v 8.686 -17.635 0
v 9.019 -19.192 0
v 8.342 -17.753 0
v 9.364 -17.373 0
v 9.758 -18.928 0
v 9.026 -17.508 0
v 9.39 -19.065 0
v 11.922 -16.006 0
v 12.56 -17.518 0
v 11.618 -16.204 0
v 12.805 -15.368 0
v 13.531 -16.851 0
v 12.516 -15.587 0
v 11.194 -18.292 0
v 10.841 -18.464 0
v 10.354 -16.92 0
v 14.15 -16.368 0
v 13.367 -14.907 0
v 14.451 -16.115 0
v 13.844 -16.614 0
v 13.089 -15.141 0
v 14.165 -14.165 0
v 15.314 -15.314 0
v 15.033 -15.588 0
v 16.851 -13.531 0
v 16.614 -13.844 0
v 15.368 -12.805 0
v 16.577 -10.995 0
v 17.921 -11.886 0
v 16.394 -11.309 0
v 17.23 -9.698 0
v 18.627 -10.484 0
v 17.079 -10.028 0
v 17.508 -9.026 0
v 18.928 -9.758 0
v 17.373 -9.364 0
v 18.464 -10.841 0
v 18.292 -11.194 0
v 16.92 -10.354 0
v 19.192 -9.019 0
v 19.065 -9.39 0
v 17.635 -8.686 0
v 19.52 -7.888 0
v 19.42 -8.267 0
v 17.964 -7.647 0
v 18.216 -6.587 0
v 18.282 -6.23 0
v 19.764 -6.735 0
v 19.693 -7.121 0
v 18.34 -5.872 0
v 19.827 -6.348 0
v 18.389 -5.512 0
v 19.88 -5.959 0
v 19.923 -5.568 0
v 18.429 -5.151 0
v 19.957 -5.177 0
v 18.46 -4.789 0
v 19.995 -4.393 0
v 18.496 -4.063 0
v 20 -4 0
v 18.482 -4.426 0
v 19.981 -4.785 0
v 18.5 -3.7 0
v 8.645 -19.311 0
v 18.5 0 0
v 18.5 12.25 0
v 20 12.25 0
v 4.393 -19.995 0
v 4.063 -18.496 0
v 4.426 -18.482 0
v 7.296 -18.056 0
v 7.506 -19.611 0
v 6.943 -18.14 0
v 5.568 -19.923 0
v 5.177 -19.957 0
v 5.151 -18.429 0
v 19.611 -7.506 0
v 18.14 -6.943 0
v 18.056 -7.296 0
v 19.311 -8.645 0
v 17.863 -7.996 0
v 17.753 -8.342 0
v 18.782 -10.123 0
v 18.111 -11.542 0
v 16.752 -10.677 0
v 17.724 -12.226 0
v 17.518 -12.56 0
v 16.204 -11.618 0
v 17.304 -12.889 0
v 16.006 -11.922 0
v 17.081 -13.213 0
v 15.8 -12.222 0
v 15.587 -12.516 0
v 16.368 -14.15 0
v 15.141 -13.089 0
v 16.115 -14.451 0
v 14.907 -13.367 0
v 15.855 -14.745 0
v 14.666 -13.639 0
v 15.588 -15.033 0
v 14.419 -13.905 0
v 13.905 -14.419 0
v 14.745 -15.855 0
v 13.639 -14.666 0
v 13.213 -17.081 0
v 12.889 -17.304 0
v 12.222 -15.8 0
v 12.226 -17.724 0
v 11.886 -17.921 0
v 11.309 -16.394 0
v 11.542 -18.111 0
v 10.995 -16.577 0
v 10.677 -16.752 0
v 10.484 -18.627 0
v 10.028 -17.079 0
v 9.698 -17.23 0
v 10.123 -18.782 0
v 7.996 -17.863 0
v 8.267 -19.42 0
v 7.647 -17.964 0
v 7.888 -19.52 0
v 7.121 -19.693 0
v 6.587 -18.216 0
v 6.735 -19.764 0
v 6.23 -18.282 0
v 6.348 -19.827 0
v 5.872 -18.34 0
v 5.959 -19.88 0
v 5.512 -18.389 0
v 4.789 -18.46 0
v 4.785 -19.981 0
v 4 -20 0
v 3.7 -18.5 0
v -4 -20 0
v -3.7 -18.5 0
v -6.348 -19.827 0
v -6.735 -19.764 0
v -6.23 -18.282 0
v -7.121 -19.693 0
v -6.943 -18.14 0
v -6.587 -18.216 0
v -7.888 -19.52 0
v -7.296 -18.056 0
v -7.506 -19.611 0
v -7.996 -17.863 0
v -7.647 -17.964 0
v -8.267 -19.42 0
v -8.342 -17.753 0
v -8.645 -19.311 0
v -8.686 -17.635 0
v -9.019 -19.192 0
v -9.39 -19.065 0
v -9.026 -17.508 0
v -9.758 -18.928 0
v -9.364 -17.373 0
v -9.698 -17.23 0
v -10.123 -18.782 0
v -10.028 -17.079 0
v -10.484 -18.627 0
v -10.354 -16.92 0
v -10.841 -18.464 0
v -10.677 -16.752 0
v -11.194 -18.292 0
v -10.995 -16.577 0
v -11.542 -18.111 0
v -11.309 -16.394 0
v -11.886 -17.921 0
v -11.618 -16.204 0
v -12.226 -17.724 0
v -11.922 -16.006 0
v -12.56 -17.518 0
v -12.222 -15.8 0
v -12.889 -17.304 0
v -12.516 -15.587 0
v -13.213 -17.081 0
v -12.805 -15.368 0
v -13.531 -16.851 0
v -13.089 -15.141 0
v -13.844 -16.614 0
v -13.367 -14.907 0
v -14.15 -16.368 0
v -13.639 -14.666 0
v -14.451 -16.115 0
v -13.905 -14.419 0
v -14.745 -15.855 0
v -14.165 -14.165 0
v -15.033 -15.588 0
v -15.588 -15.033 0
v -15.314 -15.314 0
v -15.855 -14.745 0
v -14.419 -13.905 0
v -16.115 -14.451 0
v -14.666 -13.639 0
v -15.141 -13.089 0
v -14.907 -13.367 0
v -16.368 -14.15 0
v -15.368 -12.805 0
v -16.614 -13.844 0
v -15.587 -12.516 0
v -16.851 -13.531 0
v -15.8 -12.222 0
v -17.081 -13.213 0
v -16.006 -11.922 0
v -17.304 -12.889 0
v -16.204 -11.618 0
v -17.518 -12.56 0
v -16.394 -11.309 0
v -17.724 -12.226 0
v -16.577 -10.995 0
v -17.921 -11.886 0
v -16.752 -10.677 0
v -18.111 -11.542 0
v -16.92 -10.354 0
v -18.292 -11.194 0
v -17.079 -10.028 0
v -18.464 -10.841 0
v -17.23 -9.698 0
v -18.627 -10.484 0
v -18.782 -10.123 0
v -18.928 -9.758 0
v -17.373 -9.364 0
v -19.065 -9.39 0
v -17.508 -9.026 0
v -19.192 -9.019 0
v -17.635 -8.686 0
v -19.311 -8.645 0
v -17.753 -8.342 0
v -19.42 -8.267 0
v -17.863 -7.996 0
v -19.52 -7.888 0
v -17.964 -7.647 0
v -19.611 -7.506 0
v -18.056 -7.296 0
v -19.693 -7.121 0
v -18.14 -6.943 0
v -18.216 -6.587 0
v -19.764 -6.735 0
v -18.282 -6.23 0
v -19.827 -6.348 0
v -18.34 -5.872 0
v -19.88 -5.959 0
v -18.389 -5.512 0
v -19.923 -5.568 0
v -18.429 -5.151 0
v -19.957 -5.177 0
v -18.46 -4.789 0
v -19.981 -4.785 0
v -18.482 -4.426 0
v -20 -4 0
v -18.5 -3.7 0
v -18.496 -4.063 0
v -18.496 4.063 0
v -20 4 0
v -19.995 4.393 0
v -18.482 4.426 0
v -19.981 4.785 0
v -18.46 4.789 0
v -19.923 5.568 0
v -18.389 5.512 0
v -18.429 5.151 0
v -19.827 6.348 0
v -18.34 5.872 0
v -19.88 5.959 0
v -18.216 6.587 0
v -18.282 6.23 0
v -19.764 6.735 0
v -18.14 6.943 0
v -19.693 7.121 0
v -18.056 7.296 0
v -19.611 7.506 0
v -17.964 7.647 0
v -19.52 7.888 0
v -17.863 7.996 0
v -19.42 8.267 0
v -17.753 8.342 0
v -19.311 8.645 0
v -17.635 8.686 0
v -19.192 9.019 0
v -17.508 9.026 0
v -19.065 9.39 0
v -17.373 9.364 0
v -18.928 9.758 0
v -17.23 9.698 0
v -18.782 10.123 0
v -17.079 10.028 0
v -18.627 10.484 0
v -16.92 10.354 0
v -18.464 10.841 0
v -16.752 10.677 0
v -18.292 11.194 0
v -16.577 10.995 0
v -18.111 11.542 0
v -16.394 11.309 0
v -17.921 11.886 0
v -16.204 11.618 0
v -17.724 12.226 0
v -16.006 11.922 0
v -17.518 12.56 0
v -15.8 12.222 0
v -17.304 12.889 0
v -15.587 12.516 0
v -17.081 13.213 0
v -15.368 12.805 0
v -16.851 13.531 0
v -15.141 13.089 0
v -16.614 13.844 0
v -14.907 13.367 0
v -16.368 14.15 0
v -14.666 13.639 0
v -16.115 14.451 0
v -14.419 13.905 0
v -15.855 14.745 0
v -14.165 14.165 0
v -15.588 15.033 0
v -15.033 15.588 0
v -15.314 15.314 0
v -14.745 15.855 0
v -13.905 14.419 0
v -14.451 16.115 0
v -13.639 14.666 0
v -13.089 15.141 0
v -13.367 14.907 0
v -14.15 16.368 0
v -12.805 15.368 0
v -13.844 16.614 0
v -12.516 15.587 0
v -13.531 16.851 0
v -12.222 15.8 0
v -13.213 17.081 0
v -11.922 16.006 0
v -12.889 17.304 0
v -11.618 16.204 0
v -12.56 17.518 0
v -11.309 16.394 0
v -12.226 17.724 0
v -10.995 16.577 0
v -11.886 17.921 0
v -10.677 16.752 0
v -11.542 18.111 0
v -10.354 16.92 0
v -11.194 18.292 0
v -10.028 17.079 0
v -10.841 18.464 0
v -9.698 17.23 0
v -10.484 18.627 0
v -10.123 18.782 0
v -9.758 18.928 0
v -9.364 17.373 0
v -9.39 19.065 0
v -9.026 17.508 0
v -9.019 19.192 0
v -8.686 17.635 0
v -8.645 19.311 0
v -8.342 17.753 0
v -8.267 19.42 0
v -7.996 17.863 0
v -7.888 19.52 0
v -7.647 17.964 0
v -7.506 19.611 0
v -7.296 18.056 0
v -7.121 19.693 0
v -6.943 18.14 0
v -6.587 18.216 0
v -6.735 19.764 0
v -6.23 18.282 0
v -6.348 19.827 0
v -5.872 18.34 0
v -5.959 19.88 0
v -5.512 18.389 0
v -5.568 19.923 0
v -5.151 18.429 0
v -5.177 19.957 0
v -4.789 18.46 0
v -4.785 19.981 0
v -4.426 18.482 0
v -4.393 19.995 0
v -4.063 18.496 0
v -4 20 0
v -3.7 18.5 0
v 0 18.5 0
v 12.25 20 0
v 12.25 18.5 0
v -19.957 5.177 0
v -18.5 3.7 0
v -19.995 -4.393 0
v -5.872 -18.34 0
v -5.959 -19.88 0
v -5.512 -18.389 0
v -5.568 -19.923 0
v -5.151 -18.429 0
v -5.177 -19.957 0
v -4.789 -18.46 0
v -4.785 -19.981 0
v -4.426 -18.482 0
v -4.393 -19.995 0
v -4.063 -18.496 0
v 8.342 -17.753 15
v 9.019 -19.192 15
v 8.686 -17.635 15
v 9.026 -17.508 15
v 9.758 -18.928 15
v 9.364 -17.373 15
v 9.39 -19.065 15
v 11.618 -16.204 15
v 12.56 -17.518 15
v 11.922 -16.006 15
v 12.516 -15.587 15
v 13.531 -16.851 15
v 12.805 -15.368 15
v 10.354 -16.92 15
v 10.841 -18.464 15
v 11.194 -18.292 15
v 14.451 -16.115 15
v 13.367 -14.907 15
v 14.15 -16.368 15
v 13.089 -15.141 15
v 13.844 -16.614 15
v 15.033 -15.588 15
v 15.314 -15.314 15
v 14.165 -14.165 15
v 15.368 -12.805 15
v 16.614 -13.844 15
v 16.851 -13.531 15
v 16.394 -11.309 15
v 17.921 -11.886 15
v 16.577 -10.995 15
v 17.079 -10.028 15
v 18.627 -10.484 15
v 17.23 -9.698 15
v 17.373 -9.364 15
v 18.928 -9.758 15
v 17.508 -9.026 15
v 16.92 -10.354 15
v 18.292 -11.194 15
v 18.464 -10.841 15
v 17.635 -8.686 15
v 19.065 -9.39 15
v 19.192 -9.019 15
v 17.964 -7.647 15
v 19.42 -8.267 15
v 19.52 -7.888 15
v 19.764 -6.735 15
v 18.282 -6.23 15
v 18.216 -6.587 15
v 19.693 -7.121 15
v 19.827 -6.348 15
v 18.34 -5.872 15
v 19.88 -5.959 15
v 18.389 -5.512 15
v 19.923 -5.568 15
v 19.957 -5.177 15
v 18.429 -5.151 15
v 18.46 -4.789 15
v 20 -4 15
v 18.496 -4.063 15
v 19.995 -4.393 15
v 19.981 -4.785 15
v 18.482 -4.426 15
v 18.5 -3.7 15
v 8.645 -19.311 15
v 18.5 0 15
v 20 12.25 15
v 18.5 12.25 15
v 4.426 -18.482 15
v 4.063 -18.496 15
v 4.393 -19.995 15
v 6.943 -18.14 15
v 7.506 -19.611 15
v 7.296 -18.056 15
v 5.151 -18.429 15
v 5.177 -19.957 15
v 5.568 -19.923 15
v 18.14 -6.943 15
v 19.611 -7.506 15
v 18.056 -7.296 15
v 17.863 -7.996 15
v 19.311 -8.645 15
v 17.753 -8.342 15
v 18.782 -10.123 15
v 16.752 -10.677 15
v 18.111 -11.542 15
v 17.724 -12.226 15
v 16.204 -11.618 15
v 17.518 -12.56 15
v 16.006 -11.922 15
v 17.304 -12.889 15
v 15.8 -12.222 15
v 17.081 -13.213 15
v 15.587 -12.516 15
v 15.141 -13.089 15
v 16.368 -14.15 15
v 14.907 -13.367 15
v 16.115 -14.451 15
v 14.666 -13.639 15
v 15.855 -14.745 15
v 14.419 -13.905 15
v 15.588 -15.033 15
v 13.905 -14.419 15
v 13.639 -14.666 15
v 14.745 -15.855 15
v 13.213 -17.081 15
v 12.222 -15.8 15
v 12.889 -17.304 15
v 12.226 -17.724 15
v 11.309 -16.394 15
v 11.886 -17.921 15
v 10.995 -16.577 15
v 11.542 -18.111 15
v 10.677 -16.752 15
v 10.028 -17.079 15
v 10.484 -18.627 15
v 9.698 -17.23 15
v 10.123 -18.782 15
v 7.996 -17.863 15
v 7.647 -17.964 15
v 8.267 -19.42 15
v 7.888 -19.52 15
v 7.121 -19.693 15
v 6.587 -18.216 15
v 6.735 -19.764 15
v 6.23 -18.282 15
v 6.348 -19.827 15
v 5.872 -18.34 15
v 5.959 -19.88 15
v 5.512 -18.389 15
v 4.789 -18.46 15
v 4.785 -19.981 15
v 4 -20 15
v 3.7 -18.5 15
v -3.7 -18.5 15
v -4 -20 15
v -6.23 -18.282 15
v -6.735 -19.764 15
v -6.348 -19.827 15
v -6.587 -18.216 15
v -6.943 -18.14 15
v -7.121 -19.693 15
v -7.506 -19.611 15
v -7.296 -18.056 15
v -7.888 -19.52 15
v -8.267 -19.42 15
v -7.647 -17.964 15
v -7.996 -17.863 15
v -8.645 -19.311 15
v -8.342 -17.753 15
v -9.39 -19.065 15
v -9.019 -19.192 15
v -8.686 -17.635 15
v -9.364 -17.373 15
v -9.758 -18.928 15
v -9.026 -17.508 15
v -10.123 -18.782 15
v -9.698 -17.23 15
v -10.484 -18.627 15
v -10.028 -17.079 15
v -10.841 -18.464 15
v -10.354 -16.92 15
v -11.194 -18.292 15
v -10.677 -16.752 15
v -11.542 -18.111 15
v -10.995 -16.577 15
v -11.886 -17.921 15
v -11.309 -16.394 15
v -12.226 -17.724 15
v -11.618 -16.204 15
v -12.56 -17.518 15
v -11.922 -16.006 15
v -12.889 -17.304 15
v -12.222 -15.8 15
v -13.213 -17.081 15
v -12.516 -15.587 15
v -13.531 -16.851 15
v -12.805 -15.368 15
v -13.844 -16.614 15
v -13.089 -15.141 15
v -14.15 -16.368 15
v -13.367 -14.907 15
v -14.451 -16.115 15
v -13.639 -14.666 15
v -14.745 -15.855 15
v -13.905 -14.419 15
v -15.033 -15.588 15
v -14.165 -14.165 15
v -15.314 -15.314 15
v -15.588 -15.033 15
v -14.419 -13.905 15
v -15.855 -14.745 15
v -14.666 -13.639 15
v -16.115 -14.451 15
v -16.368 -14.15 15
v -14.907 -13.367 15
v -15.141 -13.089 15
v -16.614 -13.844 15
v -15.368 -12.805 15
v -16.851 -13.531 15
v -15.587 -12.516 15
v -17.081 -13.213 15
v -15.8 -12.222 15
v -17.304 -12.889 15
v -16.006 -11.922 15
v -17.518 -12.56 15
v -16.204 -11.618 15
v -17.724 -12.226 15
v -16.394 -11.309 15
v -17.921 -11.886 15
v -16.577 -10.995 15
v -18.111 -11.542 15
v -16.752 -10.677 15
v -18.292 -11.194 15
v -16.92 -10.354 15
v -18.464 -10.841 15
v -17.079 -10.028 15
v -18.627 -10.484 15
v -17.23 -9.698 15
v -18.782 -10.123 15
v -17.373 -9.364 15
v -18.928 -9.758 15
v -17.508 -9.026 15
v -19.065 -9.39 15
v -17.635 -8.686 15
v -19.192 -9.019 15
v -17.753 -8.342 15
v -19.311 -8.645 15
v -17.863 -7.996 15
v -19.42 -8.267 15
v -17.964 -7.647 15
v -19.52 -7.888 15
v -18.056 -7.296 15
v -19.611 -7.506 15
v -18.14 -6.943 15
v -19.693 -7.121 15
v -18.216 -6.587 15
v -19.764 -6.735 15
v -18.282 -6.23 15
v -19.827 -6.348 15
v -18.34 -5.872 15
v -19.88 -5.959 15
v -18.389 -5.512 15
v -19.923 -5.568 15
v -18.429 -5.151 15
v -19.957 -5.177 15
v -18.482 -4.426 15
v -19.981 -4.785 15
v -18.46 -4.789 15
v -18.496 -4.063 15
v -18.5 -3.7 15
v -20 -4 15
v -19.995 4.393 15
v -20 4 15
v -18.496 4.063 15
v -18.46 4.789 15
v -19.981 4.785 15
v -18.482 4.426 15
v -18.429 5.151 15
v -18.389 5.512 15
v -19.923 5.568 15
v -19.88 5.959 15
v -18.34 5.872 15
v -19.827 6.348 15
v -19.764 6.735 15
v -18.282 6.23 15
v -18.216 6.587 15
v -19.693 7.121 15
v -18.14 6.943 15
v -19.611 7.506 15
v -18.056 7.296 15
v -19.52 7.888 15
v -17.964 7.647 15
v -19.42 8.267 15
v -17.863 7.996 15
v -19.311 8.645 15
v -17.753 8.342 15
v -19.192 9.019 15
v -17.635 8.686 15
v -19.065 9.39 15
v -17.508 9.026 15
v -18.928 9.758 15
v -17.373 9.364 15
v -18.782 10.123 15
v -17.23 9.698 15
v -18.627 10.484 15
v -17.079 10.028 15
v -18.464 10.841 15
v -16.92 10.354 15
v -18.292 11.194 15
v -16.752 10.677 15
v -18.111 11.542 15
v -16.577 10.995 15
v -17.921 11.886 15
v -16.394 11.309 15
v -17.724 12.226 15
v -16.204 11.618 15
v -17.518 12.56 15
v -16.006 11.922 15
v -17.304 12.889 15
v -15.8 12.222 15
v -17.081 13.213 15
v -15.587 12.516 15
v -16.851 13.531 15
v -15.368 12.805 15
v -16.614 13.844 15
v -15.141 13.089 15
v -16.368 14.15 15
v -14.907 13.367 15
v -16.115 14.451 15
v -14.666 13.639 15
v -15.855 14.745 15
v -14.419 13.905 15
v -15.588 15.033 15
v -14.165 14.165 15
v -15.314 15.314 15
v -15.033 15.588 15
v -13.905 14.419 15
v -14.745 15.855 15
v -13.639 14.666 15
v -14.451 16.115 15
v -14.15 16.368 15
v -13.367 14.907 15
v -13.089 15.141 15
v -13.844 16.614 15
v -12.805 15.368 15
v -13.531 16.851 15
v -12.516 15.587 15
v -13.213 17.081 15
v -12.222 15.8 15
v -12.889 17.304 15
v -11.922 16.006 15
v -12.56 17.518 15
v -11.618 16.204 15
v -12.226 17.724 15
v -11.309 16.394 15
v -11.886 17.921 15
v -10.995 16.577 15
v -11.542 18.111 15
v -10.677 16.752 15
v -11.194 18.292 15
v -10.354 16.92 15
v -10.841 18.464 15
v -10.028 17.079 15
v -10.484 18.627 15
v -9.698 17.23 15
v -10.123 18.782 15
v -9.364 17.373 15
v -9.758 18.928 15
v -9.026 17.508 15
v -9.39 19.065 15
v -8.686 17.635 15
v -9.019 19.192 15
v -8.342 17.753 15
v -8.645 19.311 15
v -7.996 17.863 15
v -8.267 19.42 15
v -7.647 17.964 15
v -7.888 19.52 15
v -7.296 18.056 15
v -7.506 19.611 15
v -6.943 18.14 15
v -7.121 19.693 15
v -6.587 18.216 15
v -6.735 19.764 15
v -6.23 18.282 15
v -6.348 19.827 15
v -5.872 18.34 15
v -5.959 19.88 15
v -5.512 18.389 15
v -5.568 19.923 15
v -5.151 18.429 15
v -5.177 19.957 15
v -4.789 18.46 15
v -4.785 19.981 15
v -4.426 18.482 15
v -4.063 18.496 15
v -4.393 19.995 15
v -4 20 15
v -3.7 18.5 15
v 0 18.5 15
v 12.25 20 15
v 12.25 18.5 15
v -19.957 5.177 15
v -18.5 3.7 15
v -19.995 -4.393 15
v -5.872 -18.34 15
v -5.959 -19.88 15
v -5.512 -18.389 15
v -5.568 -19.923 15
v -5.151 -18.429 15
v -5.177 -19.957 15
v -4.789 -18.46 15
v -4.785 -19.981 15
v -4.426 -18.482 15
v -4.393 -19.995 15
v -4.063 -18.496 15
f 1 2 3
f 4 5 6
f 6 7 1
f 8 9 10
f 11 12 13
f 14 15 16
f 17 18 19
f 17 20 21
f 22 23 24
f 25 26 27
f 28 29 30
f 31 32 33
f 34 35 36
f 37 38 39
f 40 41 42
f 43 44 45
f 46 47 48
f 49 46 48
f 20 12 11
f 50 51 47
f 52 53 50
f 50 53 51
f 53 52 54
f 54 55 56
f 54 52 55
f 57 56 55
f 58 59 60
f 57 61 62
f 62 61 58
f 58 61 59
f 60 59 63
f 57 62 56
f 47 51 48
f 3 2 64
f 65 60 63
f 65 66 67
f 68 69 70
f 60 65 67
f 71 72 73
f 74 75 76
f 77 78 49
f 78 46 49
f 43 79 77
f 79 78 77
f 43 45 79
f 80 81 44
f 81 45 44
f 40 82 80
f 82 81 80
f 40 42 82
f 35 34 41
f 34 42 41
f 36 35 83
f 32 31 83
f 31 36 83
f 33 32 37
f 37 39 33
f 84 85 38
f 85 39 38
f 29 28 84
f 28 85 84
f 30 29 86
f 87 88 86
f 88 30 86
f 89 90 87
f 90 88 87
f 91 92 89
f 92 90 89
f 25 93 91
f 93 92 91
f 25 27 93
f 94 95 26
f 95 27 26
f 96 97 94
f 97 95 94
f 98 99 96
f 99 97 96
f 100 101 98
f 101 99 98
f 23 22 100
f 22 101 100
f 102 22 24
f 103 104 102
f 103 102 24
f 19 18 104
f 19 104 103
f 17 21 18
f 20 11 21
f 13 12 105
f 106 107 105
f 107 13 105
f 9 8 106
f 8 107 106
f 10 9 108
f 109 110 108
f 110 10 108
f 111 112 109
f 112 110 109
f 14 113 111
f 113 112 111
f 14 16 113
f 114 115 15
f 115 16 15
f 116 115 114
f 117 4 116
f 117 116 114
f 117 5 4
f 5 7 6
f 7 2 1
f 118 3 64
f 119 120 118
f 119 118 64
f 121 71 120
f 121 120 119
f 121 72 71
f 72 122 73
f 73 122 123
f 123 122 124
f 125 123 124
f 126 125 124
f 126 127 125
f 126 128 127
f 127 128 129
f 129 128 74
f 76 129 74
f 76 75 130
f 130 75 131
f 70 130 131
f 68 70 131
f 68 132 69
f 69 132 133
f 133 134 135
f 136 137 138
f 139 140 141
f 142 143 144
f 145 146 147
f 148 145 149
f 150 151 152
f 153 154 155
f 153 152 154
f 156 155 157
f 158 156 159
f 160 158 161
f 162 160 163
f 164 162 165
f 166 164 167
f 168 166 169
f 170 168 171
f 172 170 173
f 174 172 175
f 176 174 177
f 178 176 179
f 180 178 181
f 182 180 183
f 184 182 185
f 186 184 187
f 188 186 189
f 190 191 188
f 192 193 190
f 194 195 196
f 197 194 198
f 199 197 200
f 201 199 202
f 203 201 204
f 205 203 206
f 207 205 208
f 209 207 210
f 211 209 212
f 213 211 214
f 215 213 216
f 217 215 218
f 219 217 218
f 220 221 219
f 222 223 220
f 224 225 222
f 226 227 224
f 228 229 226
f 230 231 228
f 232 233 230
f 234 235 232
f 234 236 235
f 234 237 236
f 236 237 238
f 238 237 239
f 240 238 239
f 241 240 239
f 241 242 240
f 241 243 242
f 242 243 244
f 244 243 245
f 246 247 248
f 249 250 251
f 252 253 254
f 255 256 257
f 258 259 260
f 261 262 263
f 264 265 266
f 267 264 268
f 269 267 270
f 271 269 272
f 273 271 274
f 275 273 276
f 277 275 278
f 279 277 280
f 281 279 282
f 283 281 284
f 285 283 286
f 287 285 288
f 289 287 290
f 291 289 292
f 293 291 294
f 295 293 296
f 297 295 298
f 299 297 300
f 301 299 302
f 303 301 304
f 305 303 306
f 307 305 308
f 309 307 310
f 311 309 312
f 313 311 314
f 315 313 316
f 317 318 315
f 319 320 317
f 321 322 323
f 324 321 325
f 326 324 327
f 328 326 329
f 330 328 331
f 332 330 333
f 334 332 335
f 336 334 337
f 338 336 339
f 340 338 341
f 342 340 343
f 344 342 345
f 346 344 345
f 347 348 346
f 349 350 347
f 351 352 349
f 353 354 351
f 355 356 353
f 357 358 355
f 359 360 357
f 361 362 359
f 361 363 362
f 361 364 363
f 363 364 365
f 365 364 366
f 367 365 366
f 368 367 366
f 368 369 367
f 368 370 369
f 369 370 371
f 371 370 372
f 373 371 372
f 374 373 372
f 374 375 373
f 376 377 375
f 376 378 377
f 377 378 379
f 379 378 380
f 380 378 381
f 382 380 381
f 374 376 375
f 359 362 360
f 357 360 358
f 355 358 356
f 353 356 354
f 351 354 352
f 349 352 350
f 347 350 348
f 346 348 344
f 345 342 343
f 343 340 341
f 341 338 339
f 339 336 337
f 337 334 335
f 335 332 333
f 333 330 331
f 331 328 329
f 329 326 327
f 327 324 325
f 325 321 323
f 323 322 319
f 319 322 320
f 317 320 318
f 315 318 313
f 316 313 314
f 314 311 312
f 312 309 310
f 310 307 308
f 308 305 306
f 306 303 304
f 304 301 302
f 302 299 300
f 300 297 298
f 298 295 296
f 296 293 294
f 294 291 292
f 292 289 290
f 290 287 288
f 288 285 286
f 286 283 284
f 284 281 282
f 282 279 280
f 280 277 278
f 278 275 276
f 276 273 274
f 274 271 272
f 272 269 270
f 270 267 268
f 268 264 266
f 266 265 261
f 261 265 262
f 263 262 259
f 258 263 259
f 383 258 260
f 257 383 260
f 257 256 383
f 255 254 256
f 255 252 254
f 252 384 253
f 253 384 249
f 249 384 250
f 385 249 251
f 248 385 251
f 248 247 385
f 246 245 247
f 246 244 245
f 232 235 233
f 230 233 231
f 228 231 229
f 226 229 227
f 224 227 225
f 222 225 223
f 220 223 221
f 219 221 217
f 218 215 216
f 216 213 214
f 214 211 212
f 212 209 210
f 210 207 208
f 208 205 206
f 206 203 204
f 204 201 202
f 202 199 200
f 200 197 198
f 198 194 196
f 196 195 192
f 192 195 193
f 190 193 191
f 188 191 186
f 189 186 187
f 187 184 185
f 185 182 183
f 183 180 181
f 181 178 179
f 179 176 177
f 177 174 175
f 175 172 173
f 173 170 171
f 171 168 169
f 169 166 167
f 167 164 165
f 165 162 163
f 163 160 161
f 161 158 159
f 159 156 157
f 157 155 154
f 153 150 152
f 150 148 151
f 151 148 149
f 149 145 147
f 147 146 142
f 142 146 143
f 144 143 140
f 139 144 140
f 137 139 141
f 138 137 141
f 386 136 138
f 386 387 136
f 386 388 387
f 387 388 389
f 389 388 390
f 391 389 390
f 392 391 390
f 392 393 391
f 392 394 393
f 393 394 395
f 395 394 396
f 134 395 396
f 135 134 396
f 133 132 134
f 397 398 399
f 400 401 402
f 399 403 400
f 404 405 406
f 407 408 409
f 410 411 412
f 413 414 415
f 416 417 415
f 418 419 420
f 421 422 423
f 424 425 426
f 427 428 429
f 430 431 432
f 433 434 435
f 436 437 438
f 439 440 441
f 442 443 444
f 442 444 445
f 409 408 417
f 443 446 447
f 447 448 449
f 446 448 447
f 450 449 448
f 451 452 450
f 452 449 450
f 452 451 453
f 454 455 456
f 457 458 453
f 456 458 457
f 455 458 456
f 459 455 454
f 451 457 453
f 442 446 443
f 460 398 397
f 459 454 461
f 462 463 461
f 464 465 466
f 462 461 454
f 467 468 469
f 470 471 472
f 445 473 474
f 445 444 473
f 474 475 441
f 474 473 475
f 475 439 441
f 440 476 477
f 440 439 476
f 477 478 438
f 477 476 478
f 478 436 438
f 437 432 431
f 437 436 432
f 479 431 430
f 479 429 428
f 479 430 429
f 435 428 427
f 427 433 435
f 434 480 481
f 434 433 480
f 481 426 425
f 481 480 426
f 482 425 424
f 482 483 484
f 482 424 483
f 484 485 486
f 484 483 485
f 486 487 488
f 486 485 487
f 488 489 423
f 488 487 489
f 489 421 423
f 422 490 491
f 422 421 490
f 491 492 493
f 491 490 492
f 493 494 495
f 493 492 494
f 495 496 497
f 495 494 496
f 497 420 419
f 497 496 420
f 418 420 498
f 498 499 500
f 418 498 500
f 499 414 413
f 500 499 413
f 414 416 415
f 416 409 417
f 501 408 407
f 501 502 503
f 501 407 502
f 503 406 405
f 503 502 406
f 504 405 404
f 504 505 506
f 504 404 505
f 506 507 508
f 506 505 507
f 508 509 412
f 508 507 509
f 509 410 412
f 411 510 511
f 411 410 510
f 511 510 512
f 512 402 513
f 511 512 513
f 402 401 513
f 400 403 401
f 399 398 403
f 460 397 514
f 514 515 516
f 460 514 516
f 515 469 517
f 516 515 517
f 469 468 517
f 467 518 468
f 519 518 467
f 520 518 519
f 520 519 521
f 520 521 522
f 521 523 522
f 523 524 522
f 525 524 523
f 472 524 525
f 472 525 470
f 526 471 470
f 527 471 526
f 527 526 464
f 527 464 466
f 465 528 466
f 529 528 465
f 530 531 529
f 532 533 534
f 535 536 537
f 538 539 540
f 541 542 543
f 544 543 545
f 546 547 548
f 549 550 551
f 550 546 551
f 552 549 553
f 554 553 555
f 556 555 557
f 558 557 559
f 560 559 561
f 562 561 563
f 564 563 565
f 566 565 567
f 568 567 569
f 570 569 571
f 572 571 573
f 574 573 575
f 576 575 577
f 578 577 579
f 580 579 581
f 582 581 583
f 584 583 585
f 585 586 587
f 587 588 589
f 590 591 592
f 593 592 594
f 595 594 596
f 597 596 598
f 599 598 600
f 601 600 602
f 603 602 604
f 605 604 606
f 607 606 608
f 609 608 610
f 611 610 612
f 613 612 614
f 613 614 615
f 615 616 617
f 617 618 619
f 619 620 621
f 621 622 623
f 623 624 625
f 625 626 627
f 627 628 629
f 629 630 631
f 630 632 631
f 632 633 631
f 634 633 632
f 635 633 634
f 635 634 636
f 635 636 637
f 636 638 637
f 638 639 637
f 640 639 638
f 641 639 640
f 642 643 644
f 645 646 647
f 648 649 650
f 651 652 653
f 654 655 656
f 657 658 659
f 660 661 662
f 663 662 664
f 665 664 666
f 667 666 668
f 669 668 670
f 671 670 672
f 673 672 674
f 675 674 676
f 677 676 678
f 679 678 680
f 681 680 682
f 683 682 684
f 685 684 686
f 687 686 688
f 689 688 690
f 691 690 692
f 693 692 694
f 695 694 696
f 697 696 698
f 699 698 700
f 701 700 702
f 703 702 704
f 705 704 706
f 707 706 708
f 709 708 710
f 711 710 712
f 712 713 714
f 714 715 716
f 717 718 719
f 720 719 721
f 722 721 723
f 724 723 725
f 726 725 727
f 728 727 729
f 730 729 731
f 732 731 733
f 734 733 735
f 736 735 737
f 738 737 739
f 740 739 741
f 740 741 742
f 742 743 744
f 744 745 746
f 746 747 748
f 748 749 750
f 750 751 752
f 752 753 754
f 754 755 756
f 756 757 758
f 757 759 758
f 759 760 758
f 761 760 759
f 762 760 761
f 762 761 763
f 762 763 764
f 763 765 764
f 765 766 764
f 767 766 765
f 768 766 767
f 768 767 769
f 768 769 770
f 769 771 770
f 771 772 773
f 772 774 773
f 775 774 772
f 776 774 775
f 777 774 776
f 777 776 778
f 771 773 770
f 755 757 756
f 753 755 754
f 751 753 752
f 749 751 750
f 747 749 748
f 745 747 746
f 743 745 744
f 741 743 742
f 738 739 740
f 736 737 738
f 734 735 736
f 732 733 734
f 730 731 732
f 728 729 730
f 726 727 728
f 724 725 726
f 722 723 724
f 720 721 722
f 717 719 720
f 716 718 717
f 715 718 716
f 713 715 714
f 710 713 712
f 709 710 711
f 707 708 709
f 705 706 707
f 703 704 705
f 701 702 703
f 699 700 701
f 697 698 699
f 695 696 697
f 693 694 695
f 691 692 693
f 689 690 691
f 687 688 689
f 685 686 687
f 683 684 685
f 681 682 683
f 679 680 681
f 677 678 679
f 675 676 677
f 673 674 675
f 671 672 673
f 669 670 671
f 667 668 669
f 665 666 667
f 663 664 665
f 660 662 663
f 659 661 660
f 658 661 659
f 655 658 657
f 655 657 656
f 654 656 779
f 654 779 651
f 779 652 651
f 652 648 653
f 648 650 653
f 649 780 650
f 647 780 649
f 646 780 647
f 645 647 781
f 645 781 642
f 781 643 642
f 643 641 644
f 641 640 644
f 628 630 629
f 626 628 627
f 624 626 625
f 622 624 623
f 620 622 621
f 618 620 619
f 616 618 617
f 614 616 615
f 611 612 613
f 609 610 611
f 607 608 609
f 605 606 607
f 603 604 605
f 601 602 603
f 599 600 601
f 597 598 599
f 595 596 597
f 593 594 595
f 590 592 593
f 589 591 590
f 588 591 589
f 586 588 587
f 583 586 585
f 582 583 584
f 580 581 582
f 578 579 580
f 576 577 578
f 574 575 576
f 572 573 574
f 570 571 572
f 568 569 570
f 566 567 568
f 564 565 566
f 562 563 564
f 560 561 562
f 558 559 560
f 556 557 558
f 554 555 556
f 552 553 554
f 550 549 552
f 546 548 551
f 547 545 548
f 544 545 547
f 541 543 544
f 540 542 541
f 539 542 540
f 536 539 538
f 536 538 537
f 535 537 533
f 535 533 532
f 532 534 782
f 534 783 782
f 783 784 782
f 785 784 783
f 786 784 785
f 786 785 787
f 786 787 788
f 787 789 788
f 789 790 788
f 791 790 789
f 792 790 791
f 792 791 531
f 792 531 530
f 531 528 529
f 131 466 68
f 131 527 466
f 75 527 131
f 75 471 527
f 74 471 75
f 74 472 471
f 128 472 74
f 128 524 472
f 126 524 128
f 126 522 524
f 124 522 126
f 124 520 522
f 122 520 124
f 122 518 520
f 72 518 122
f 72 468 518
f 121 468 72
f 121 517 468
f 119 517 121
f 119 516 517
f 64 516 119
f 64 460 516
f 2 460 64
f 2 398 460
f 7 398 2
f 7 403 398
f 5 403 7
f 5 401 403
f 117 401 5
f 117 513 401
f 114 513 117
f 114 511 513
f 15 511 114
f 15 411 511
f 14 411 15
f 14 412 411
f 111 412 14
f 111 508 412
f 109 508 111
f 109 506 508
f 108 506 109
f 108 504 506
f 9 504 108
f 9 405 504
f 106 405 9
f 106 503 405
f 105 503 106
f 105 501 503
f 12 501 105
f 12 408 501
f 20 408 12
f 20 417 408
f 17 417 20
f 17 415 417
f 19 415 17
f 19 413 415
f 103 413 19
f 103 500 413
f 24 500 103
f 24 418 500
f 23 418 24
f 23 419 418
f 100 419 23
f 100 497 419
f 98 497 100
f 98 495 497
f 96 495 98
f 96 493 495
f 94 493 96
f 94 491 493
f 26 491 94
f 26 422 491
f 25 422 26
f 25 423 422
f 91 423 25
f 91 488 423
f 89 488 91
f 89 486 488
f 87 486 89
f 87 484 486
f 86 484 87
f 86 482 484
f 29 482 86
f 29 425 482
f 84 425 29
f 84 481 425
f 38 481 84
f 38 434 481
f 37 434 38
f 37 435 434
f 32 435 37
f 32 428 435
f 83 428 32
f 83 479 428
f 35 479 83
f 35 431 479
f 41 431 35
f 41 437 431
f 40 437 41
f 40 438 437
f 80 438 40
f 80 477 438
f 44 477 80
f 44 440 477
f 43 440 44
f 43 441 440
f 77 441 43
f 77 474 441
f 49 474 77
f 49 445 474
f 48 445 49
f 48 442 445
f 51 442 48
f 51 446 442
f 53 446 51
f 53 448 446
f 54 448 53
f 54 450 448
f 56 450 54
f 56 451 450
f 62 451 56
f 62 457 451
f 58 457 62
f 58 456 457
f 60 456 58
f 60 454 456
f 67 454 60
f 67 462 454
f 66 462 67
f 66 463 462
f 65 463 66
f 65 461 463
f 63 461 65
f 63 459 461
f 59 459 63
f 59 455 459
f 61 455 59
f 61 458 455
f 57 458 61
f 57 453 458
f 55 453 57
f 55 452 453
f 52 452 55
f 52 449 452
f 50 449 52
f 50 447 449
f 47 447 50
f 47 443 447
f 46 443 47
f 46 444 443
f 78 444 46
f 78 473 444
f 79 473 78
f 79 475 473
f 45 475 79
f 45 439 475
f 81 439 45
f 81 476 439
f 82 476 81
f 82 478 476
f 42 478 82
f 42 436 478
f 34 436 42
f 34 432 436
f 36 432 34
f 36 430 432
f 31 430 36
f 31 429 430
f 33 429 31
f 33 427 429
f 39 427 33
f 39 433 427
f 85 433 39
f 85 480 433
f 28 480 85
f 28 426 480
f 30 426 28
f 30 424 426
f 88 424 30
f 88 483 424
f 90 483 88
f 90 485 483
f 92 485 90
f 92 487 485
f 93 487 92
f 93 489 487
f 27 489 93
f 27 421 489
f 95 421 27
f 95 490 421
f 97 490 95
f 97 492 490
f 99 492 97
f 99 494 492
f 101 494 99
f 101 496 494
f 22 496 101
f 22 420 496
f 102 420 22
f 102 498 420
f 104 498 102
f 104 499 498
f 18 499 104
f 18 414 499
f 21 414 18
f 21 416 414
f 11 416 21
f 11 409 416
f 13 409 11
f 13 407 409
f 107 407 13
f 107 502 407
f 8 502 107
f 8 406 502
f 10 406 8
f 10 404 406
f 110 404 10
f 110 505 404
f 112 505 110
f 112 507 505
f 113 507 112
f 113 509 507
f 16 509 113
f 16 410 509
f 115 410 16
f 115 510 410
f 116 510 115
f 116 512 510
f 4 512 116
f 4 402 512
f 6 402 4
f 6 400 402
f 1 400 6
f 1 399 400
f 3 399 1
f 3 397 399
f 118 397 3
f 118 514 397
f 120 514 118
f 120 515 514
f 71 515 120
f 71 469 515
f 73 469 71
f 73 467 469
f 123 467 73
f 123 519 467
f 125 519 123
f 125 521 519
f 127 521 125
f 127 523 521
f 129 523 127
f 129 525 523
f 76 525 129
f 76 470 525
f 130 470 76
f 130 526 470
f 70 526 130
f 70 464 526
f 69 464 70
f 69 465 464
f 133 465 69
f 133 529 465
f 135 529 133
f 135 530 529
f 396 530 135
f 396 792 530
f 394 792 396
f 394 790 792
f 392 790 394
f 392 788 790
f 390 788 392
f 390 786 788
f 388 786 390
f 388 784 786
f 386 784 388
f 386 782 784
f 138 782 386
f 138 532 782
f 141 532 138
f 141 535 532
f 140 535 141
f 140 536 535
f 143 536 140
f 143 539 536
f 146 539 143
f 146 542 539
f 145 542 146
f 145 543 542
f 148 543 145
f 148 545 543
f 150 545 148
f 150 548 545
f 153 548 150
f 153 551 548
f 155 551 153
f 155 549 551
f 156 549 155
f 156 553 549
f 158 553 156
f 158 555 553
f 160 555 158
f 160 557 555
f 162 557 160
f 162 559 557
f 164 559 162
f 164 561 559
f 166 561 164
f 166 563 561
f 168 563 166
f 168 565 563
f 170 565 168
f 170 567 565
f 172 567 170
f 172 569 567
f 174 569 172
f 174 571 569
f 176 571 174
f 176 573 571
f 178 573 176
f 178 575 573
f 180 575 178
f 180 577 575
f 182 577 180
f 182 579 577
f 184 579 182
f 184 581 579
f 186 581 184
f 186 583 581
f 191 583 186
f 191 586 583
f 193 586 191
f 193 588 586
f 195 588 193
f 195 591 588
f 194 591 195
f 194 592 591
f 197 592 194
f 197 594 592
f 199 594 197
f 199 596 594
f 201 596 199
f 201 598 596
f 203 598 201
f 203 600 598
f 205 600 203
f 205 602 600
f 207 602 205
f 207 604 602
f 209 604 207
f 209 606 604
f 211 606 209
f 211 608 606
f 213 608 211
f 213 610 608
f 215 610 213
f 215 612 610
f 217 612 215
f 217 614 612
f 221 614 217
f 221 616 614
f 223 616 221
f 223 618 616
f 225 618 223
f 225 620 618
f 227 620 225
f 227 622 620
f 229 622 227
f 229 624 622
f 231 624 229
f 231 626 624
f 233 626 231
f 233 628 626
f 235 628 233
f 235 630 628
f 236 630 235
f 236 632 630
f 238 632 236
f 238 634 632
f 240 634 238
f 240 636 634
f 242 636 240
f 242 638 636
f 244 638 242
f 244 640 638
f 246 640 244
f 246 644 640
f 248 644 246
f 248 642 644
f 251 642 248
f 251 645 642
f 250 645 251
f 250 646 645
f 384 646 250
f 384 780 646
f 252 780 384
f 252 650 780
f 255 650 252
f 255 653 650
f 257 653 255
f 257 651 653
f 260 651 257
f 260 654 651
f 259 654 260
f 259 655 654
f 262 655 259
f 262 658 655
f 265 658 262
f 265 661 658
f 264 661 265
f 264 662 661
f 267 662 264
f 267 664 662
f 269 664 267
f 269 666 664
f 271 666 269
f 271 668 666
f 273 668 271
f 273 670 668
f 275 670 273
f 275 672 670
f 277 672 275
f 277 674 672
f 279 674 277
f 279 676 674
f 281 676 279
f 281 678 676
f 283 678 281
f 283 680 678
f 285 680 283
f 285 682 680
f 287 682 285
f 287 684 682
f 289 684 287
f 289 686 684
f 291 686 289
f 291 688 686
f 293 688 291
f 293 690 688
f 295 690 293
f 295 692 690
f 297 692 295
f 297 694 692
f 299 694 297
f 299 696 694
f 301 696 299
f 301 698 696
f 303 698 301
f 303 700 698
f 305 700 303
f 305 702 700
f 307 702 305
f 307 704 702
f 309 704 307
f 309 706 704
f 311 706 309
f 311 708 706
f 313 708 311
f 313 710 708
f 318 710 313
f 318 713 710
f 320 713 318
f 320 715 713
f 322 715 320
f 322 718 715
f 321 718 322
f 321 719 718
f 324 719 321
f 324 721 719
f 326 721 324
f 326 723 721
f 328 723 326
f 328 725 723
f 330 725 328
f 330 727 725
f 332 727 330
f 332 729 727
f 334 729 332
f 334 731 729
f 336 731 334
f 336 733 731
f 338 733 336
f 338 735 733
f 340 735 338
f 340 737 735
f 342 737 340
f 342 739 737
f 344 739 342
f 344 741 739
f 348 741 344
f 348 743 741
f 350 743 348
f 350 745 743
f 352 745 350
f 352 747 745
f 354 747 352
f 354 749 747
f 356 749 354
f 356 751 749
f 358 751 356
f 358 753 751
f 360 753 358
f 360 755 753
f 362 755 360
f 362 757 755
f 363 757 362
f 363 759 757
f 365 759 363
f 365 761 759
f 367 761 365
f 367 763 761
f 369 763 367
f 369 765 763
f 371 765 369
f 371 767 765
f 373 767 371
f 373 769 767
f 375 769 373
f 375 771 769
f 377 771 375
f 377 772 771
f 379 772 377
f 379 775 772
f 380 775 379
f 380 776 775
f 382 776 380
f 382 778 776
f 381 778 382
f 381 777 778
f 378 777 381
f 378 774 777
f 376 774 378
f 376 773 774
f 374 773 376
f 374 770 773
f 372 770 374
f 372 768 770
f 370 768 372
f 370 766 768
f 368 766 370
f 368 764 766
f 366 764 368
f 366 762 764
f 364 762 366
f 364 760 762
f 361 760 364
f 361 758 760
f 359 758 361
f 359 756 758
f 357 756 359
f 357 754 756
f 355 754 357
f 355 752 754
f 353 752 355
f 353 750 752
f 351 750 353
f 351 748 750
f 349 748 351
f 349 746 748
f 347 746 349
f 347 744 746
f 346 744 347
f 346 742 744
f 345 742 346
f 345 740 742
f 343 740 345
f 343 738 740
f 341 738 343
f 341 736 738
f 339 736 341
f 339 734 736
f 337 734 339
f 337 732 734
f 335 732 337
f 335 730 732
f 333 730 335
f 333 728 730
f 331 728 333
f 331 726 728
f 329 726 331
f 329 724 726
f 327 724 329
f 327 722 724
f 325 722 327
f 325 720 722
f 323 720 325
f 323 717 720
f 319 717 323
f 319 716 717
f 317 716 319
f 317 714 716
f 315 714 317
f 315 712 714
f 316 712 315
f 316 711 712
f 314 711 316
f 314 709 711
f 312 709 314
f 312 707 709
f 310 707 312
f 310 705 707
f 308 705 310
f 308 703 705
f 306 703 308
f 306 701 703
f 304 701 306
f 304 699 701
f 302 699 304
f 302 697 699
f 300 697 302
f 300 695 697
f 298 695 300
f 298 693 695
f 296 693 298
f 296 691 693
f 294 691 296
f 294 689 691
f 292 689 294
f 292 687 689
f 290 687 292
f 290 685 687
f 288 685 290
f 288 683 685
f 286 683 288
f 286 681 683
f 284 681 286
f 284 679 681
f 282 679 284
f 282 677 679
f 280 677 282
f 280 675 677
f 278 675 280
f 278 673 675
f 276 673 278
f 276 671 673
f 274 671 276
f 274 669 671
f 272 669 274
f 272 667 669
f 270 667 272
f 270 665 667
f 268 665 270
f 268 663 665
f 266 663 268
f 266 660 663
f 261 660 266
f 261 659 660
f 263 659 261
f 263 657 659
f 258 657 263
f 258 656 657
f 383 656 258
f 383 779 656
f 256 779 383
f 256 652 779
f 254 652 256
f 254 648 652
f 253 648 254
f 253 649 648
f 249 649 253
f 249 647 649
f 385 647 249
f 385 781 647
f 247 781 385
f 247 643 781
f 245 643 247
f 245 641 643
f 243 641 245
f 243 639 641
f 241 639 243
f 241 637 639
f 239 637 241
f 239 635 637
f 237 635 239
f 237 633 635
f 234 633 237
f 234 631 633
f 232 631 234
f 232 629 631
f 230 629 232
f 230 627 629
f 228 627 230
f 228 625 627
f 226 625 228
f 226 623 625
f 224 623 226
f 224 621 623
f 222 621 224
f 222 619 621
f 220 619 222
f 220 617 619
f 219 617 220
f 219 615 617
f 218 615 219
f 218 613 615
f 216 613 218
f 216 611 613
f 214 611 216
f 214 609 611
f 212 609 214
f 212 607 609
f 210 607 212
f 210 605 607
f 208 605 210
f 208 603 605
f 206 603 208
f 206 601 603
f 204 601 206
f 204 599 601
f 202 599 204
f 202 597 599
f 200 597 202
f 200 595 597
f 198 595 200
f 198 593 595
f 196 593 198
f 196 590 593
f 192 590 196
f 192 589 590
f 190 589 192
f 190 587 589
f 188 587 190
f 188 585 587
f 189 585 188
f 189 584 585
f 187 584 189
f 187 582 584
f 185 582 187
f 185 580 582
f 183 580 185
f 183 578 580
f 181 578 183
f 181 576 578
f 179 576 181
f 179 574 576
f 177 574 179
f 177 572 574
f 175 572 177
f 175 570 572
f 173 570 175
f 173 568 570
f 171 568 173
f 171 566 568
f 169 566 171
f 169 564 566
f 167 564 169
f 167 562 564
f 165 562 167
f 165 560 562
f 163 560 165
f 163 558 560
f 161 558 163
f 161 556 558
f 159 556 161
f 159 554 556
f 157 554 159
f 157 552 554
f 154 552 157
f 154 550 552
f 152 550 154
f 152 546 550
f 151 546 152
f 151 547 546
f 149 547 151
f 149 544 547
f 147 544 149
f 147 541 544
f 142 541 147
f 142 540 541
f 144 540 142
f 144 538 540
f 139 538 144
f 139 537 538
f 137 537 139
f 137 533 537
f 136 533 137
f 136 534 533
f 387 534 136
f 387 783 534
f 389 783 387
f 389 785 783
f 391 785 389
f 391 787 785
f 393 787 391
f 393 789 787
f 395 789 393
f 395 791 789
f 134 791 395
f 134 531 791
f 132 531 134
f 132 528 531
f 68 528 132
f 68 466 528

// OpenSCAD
$fn = $preview ? 64 : 256;

hole = 37;
border = 3;
base_height = 15;

module rounded_square(width, radius_corner) {
	translate([radius_corner-width/2, radius_corner-width/2, 0]) minkowski() {
		square(width - 2 * radius_corner);
		circle(radius_corner);
	}
}

linear_extrude(base_height) difference() {
	union() {
		rounded_square(hole+border, (hole+border)/2.5);
		square((hole+border)/2);
	}
	union() {
		rounded_square(hole, hole/2.5);
		square((hole)/2);
		translate([hole/4+border, hole/4+border, 0]) square((hole)/4);
	}
}
